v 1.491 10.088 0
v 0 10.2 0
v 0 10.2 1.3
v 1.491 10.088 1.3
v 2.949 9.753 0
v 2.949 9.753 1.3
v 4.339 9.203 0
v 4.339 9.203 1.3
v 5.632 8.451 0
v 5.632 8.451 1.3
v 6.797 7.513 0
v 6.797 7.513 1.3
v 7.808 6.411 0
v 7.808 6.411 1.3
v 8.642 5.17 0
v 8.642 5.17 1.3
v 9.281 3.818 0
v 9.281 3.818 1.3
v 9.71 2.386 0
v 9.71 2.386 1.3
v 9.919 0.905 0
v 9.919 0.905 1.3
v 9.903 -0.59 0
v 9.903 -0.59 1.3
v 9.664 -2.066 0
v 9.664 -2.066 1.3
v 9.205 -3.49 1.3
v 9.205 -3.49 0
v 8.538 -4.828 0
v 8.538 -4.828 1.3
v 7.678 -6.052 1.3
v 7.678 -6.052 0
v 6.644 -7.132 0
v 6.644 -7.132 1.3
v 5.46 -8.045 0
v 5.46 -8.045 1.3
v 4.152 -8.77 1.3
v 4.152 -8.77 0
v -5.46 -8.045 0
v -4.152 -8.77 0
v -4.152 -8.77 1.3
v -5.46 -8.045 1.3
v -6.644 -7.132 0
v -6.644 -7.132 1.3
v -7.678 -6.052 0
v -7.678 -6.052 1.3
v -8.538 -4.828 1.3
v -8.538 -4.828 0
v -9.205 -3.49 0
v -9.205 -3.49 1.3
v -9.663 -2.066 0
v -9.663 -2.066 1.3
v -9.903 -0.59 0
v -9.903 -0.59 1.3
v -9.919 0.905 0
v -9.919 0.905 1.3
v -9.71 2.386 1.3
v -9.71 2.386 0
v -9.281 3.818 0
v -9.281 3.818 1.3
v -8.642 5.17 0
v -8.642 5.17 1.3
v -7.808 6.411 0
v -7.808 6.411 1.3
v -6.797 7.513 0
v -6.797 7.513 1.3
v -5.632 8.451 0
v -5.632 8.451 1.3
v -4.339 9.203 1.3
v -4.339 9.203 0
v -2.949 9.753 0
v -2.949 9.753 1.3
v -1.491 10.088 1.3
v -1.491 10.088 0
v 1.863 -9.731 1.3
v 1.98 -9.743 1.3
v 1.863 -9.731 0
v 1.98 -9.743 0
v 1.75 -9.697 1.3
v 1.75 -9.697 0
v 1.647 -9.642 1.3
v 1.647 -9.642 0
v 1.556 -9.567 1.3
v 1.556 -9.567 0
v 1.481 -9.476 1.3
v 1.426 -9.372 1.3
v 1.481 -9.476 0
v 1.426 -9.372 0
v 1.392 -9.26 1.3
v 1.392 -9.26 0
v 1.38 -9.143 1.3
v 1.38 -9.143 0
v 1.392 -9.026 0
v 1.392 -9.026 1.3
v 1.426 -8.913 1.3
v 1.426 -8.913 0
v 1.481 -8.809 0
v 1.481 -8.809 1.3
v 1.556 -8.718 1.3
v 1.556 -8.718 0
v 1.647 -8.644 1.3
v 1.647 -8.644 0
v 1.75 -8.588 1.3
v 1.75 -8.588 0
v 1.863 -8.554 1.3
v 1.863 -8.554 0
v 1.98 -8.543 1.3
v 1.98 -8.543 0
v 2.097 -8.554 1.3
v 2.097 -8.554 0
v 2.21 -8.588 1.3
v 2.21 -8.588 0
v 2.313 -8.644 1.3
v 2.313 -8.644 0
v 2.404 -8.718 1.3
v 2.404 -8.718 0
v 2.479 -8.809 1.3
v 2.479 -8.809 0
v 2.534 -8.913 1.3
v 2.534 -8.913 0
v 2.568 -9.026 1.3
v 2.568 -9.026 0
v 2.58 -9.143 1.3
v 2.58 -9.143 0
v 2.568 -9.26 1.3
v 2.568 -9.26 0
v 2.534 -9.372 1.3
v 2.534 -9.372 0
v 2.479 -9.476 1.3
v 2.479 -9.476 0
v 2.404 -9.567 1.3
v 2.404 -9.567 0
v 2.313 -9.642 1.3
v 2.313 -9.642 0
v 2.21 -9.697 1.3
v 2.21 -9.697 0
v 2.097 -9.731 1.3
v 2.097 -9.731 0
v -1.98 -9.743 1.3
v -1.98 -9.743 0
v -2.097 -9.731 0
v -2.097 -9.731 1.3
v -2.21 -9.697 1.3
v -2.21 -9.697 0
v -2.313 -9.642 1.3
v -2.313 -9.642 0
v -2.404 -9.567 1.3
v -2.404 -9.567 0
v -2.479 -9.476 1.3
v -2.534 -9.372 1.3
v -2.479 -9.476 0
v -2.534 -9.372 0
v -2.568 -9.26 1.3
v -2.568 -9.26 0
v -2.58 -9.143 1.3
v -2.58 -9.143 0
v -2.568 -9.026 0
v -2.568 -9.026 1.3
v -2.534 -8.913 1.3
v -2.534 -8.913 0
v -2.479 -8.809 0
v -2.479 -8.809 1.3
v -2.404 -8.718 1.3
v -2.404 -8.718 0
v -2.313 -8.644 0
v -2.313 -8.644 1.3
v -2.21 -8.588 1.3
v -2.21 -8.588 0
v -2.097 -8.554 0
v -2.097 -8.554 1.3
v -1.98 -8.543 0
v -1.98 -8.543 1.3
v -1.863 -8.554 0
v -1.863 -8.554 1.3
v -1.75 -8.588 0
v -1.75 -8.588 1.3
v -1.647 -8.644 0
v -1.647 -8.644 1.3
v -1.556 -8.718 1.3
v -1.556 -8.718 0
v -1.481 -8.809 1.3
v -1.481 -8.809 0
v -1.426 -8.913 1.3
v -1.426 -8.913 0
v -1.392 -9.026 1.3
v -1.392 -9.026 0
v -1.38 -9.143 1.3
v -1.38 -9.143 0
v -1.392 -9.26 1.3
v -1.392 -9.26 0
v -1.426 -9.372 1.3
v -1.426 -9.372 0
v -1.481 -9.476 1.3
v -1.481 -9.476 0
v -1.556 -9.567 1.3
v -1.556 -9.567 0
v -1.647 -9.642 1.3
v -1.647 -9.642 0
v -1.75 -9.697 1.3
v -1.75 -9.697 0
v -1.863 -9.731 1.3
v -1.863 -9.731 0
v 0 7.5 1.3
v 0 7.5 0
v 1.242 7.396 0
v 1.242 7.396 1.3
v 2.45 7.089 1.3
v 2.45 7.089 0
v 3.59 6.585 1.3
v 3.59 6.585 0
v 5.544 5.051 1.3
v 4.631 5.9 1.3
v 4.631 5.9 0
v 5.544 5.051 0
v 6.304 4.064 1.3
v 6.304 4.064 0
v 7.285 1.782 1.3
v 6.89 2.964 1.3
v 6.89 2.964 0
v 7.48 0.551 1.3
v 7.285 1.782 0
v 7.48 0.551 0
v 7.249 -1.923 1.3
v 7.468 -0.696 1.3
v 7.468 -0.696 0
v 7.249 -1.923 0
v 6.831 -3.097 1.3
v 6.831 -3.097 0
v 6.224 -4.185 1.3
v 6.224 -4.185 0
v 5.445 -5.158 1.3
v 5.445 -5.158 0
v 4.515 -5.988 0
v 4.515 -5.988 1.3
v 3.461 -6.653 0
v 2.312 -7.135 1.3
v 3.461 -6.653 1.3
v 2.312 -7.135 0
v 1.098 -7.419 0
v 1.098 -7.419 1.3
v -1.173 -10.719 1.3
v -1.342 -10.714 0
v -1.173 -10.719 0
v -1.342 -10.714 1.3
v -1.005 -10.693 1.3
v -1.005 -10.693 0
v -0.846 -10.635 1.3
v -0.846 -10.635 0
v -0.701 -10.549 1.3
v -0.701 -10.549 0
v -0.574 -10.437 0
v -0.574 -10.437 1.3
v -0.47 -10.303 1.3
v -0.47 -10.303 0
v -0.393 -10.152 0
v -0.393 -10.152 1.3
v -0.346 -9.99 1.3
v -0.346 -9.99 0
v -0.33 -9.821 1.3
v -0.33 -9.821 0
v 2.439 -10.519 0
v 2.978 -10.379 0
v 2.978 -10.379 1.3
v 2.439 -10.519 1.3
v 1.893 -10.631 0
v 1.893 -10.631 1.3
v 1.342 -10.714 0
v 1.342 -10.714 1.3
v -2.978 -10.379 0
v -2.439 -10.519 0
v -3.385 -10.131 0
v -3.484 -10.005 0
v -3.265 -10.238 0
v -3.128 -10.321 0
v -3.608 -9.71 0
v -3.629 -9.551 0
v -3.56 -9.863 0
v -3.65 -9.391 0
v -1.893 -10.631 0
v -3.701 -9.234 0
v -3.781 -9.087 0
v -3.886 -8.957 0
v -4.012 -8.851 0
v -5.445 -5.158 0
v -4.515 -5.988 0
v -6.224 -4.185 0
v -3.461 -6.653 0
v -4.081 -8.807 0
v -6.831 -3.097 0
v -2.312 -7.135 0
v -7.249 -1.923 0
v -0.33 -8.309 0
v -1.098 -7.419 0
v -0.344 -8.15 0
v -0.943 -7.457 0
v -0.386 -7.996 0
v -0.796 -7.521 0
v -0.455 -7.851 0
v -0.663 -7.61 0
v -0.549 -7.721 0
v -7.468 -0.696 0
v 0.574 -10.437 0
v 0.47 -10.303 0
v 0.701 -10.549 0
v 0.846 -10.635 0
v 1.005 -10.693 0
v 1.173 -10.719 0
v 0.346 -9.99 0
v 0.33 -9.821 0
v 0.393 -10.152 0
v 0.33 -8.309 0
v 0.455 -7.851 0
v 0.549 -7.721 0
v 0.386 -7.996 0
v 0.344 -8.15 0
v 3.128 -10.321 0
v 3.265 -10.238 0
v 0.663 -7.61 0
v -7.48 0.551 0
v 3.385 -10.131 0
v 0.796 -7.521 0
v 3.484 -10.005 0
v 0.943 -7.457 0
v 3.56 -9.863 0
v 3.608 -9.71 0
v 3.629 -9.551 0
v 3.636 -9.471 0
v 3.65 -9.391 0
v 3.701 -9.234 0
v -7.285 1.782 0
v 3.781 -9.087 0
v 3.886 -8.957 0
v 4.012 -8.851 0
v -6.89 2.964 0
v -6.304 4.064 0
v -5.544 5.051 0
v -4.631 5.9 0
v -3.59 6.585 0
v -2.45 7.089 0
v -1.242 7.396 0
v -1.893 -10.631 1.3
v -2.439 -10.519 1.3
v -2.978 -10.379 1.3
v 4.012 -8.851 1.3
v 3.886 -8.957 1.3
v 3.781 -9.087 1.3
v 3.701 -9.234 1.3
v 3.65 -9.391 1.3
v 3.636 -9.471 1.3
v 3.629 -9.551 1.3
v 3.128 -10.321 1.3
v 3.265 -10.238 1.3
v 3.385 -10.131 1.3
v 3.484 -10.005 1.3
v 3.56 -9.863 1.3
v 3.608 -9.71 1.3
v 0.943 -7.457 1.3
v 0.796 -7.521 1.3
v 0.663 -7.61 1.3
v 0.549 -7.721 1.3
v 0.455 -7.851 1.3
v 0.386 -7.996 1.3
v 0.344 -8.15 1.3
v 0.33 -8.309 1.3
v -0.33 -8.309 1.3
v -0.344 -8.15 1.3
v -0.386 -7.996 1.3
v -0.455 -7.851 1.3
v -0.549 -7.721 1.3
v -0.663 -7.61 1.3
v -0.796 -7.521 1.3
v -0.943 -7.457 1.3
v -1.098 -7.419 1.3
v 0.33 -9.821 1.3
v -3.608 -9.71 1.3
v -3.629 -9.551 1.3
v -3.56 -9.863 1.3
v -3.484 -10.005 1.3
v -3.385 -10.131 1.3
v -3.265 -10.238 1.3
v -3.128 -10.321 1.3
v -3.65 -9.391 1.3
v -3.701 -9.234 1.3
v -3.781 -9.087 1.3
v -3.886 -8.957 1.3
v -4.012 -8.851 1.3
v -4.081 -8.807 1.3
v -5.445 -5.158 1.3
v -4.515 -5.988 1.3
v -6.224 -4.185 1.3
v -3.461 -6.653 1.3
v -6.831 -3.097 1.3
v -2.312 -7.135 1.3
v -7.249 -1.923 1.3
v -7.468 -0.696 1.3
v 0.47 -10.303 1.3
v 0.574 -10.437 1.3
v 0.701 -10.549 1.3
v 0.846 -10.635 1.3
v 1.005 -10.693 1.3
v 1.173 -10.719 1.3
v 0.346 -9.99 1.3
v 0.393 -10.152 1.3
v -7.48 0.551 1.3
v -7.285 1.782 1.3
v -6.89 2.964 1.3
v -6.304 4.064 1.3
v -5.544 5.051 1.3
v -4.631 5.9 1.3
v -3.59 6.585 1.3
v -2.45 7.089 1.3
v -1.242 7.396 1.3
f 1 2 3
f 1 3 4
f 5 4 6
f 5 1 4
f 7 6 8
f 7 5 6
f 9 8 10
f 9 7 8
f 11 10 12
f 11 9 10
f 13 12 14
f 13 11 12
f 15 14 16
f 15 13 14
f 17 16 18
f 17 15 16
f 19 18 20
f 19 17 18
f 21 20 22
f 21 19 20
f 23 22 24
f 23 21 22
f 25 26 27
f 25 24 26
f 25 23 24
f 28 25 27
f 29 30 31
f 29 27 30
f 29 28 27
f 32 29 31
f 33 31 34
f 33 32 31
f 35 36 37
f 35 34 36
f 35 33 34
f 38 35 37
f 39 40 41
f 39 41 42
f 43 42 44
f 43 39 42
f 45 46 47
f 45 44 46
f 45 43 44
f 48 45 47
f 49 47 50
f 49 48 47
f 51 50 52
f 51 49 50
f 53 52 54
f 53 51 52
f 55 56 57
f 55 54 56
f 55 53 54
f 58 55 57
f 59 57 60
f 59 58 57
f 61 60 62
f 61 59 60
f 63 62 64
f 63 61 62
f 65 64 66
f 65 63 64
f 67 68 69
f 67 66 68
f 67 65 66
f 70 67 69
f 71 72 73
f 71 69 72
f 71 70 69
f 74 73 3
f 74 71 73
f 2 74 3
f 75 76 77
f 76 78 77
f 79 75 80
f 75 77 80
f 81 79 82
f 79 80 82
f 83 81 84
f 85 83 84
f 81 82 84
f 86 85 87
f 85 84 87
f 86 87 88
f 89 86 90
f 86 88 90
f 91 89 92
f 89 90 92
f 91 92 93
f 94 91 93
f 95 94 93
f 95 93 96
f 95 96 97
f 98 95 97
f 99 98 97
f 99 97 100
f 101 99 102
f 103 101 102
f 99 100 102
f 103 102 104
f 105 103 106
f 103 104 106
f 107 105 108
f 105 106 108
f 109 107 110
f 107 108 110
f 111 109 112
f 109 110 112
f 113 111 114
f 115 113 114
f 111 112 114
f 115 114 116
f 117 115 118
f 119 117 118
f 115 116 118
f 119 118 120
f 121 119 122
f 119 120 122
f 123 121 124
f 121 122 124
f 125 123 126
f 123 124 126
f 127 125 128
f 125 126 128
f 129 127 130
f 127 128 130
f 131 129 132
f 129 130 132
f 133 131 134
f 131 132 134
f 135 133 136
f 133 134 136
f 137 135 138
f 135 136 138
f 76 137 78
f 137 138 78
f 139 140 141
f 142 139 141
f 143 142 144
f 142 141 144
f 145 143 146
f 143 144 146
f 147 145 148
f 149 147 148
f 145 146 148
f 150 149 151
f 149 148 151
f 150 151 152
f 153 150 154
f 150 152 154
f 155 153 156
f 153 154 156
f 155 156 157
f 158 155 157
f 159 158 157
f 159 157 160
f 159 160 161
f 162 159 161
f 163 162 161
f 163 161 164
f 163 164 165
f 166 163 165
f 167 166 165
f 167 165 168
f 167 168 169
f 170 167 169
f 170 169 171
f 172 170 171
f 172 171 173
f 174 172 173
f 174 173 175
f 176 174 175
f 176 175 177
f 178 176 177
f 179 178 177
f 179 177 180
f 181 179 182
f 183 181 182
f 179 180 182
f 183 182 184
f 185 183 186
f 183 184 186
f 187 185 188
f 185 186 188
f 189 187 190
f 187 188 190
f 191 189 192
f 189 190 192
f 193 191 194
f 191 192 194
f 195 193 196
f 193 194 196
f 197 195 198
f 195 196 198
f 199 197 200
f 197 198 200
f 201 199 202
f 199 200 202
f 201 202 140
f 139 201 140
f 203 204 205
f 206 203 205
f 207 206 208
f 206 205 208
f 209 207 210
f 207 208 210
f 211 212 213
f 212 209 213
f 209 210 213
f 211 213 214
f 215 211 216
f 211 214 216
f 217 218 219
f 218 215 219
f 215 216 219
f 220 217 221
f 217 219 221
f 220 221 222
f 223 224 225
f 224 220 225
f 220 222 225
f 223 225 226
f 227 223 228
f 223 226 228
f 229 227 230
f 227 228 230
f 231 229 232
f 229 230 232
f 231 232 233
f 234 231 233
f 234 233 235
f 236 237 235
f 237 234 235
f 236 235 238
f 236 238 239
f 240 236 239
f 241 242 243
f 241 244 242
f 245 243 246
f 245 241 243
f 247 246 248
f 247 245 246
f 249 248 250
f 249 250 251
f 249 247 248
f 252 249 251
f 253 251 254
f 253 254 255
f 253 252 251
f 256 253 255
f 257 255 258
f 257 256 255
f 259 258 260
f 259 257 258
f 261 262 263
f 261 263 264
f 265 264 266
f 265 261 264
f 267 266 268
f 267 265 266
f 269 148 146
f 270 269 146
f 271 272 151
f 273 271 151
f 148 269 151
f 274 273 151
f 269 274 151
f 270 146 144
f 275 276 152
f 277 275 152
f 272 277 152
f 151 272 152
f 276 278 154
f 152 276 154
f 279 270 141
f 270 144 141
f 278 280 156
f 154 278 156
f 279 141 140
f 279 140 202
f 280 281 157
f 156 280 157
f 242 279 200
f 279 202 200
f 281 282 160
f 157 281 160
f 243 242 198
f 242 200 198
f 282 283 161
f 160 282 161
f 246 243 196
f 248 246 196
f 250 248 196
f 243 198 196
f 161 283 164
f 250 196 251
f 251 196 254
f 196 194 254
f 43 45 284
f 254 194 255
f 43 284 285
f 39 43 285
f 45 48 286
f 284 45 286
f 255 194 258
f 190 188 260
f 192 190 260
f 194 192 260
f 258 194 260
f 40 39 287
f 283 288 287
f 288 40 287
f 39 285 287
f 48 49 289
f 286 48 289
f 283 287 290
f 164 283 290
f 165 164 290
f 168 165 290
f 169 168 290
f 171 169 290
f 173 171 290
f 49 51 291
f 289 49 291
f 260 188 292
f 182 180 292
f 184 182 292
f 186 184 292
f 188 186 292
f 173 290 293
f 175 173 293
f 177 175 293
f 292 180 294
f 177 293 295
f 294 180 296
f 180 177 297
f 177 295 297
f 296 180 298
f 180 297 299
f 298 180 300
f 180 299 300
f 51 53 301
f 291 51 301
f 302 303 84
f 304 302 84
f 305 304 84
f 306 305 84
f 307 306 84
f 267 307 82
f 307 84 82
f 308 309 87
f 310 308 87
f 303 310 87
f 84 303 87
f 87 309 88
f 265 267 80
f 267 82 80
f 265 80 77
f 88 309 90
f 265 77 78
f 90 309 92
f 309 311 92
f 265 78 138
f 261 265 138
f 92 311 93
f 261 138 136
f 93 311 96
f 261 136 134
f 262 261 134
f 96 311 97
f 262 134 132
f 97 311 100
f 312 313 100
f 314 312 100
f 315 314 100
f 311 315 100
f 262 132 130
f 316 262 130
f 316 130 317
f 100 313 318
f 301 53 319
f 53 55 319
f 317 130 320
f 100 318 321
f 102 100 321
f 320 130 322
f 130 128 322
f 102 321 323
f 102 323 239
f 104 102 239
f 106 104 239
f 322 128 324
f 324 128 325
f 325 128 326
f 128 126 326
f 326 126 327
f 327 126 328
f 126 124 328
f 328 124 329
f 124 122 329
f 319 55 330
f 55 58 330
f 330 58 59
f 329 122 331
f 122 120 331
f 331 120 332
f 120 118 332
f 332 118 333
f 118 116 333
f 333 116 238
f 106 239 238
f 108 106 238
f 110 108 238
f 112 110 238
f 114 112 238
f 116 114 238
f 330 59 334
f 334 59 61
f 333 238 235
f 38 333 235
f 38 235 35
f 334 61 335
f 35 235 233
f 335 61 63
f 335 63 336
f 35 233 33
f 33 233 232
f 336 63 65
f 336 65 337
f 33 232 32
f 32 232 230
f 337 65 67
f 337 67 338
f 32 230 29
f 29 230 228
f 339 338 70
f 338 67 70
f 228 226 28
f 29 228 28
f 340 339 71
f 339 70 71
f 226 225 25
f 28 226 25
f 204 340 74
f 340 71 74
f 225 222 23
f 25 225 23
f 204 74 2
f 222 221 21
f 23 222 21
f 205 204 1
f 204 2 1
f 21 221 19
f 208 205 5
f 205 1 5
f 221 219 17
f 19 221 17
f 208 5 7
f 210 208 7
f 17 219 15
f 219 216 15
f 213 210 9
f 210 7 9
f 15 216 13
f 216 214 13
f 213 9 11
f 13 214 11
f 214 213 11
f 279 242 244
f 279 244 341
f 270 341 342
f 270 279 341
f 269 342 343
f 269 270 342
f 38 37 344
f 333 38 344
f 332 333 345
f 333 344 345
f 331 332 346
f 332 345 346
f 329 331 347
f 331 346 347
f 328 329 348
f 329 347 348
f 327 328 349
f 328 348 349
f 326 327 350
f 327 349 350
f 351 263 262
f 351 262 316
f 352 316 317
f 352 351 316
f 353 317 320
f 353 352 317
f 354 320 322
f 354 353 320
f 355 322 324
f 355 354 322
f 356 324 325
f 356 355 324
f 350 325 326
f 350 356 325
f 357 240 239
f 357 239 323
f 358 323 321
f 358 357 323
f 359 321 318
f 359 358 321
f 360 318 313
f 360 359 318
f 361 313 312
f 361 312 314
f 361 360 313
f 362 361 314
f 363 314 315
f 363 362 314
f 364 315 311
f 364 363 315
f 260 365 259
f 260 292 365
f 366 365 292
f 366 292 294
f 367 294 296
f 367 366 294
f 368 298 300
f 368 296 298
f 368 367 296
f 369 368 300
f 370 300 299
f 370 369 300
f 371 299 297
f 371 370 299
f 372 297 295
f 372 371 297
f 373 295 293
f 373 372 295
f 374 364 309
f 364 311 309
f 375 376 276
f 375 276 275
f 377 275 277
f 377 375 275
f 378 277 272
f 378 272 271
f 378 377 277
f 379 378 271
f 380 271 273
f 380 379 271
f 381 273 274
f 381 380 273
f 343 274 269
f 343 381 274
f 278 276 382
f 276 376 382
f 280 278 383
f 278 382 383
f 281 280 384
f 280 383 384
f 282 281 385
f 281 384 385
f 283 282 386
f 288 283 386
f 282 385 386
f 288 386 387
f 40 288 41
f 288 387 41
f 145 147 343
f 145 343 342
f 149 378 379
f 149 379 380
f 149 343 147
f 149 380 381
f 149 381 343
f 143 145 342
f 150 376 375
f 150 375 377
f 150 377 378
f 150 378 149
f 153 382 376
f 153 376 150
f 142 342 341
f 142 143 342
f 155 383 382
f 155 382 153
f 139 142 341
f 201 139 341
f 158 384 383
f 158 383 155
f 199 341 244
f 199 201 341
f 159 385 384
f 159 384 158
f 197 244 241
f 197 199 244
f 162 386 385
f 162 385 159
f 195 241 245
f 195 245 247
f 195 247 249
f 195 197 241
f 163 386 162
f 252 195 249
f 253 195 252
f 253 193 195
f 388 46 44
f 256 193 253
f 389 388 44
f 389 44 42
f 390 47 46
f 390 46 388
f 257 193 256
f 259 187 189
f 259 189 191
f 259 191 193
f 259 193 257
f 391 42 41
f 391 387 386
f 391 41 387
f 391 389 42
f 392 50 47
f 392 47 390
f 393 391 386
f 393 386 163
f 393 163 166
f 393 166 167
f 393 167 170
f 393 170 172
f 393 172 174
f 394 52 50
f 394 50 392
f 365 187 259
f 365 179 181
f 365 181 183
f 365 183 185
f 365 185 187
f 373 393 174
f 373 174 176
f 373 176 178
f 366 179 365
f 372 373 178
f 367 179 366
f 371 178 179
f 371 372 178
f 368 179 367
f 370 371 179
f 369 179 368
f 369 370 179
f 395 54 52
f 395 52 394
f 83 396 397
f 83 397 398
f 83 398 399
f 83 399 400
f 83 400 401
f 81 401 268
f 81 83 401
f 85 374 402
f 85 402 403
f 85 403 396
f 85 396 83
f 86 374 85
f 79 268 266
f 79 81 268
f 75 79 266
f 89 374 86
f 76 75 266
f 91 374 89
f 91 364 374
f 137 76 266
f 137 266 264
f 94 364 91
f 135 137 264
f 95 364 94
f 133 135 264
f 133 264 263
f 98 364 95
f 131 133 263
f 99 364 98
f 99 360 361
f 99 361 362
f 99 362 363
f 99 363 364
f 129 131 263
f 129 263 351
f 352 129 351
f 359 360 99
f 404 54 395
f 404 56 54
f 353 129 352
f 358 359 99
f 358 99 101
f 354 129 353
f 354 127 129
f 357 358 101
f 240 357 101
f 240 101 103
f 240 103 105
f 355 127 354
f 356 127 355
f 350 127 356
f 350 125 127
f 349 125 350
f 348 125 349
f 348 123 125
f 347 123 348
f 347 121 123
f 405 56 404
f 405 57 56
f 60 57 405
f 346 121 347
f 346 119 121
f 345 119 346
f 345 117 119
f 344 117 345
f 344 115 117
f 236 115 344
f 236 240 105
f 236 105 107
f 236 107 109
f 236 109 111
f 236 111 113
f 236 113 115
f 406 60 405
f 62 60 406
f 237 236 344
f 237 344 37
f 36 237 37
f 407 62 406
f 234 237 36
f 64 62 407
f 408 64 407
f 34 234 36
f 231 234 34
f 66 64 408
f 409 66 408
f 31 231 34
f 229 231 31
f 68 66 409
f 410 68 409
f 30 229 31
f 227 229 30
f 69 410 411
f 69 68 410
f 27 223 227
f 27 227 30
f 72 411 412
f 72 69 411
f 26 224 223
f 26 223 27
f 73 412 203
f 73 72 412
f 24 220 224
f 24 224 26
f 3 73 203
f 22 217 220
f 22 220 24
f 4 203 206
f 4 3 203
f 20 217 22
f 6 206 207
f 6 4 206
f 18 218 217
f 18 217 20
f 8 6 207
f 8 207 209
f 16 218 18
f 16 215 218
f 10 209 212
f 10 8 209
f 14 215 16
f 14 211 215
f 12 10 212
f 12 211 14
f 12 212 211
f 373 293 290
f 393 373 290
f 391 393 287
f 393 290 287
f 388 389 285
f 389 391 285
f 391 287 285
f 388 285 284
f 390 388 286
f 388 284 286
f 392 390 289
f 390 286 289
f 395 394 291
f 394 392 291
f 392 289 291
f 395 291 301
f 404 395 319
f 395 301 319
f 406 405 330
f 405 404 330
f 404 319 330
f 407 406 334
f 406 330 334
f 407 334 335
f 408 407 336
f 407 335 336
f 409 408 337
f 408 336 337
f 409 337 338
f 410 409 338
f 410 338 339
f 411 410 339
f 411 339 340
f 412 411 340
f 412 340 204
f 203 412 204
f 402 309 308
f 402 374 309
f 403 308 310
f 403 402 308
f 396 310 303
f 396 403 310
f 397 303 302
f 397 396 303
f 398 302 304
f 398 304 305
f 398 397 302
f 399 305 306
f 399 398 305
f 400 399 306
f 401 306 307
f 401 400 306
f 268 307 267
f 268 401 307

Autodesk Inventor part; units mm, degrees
ref_plane "YZ Plane" through (0, 0, 0) normal (1, 0, 0) x (0, 1, 0)
ref_plane "XZ Plane" through (0, 0, 0) normal (0, 1, 0) x (-1, 0, 0)
ref_plane "XY Plane" through (0, 0, 0) normal (0, 0, 1) x (1, 0, 0)
sketch "Sketch1" plane through (0, 0, 0) normal (0, 0, 1) x (1, 0, 0)
  arc A0 (0, 7.5) -> (-0.33, -7.4927) centre (0, 0) ccw
  line L0 (0, -10.4012) -> (0, 10.52) projected
  line L1 (-0.33, -7.4927) -> (-0.33, -10.7927)
  arc A1 (-3.63, -10.1693) -> (-0.33, -10.7927) centre (0, 0) ccw
  arc A2 (0, 10.2) -> (-3.63, -8.9927) centre (0, 0.2604) ccw
  line L2 (-3.63, -8.9927) -> (-3.63, -10.1693)
  line L3 (0, 10.2) -> (0, 7.5)
  arc A3 (0.33, -7.4927) -> (0, 7.5) centre (0, 0) ccw
  line L4 (0.33, -7.4927) -> (0.33, -10.7927)
  arc A4 (0.33, -10.7927) -> (3.63, -10.1693) centre (0, 0) ccw
  arc A5 (3.63, -8.9927) -> (0, 10.2) centre (0, 0.2604) ccw
  line L5 (3.63, -8.9927) -> (3.63, -10.1693)
  line L6 (0, 10.2) -> (0, 7.5)
  dimension "d0" = 15
  dimension "d11" = 3.3
  dimension "d21" = 0.33
  dimension "d22" = 3.3
  dimension "d25" = 2.7
  dimension "d26" = 1.5
extrude "Extrusion1" add sketch "Sketch1" along normal blind 1.3
sketch "Sketch3" plane through (0, 0, 1.3) normal (0, 0, 1) x (1, 0, 0)
  line L0 (-0.33, -7.4927) -> (-0.33, -10.7927) projected
  line L1 (0, -14.9913) -> (0, 14.3985) projected
  point P0 (-1.98, -9.1427)
  point P1 (1.98, -9.1427)
  dimension "d30" = 1.65
  dimension "d31" = 1.65
hole "Hole1" at (-1.98, -9.1427, 1.3) at (1.98, -9.1427, 1.3) direction (0, 0, -1) diameter 1.2 end through all
fillet "Fillet1" radius 0.9 8 edges at (0.33, -7.4927, 0.65) (-0.33, -7.4927, 0.65) (0.33, -10.7927, 0.65) (3.63, -10.1693, 0.65) (-3.63, -10.1693, 0.65) (-3.63, -8.9927, 0.65) (-0.33, -10.7927, 0.65) (3.63, -8.9927, 0.65)
equation "\"d30\" = 0.5 * ParA"
equation "\"d31\" = 0.5 * ParA"
equation "\"d32\" = Diam5"
equation "\"d39\" = 0.333333 * b"
equation "\"d0\" = Dg"
equation "\"d11\" = ParA"
equation "\"d21\" = 0.1 * ParA"
equation "\"d22\" = ParA"
equation "\"d25\" = b"
equation "\"d26\" = ParJ"
equation "\"d27\" = tt"
equation "\"b\" = 2.7"
equation "\"Dg\" = 15"
equation "\"ParJ\" = 1.5"
equation "\"ParA\" = 3.3"
equation "\"tt\" = 1.3"
equation "\"Diam5\" = 1.2"
equation "\"TEMPLATE\" = 1.2345"
properties part number "ANSI B27.8M - 3DM1-3DM1-16" material "Steel, Mild"
